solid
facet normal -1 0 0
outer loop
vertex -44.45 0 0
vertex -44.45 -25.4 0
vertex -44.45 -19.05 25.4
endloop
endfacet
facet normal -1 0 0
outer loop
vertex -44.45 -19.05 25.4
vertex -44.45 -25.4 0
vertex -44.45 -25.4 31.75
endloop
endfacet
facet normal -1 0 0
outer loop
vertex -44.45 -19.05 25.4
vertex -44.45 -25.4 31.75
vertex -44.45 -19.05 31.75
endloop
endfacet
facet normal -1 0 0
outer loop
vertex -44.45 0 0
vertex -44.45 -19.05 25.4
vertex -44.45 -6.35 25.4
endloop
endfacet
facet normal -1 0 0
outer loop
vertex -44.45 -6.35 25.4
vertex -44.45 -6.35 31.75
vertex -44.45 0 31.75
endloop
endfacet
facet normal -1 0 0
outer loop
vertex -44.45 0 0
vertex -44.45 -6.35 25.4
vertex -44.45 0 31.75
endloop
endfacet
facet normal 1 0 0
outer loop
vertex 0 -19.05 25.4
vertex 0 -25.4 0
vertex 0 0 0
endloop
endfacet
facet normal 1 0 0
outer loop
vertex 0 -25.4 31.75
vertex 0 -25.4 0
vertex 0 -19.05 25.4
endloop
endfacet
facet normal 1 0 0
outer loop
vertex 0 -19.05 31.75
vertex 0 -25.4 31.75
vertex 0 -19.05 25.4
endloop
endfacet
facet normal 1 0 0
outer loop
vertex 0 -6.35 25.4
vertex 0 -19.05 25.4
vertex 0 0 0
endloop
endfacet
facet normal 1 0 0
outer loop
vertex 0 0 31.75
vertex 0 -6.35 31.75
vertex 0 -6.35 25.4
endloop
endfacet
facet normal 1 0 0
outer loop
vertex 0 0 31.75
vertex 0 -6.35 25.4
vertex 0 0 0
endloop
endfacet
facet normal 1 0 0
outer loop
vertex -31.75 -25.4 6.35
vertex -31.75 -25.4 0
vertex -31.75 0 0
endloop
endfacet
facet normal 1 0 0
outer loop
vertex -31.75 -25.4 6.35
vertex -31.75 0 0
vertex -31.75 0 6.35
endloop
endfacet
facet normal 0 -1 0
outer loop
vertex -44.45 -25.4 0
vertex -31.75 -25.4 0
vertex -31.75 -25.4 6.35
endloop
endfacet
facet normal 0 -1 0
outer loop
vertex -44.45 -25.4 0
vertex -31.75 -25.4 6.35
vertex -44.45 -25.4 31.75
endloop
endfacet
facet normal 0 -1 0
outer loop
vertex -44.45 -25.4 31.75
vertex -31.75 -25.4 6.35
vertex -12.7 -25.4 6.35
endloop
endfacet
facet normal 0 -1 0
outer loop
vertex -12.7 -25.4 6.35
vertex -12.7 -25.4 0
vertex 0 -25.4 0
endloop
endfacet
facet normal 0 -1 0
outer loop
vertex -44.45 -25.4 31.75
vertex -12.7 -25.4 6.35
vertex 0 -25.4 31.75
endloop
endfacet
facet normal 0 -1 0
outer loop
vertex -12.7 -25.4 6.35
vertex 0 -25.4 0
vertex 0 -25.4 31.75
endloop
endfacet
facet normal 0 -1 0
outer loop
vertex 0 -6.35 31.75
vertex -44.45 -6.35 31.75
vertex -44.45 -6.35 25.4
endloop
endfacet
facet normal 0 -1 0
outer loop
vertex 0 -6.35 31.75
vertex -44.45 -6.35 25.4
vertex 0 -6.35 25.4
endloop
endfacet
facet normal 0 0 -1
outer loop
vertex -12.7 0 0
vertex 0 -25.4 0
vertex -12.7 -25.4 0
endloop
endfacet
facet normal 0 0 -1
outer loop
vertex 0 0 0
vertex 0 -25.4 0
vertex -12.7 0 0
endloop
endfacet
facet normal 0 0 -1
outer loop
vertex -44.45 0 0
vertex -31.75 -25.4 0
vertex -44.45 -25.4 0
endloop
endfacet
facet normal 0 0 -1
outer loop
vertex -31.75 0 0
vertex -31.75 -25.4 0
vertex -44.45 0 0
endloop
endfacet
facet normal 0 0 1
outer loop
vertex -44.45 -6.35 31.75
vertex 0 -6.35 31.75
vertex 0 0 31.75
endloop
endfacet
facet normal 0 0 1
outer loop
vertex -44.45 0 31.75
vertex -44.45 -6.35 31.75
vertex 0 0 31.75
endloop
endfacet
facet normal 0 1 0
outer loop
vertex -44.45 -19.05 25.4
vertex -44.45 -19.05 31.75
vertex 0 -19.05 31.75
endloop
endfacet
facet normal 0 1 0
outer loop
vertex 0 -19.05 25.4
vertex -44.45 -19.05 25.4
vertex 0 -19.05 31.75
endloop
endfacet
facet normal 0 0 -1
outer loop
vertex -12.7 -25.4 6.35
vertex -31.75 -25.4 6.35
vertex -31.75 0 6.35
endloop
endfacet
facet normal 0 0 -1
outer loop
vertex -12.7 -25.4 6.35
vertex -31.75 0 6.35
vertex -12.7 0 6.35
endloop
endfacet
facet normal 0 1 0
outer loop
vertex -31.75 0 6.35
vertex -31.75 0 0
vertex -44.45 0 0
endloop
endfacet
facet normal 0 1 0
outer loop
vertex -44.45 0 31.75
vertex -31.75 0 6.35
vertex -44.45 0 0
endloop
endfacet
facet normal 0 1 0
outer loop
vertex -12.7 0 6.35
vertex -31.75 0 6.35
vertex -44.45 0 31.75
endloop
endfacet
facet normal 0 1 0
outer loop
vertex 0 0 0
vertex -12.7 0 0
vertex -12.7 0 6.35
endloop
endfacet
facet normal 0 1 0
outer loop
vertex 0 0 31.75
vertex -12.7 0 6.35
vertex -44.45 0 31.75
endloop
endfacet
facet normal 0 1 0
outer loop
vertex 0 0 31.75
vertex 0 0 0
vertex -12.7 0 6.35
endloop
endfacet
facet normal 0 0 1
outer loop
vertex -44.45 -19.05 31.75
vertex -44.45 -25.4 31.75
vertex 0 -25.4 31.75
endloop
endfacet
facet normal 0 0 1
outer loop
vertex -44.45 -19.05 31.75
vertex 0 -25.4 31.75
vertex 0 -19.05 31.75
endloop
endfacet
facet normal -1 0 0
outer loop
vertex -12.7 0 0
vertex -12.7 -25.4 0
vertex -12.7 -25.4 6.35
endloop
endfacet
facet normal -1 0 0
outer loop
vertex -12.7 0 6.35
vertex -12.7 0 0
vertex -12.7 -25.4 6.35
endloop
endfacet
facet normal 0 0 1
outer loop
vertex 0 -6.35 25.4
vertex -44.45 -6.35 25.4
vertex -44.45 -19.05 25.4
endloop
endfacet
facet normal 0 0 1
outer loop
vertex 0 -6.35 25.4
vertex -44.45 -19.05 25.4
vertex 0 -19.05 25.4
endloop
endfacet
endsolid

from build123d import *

# Parameters (mm, degrees)
F0_W     = 25.4
F0_H     = 31.75
F1_DEPTH = 44.45
F2_W     = 44.45
F2_H     = 12.7
F3_DEPTH = 6.35
F4_W     = 19.05
F4_H     = 6.35
F5_DEPTH = 25.4


with BuildPart() as f1:
    # F0 (on Right) → F1 (new body)
    with BuildSketch(Plane.YZ):
        with Locations((-12.7, 15.875)):
            Rectangle(F0_W, F0_H)
    extrude(amount=-F1_DEPTH)

    # F2 (on face) → F3 (cut)
    with BuildSketch(Plane.XY.offset(31.75)):
        with Locations((-22.225, -12.7)):
            Rectangle(F2_W, F2_H)
    extrude(amount=-F3_DEPTH, mode=Mode.SUBTRACT)

    # F4 (on face) → F5 (cut)
    with BuildSketch(Plane.XZ.offset(25.4)):
        with Locations((-22.225, 3.175)):
            Rectangle(F4_W, F4_H)
    extrude(amount=-F5_DEPTH, mode=Mode.SUBTRACT)


solid = f1.part
